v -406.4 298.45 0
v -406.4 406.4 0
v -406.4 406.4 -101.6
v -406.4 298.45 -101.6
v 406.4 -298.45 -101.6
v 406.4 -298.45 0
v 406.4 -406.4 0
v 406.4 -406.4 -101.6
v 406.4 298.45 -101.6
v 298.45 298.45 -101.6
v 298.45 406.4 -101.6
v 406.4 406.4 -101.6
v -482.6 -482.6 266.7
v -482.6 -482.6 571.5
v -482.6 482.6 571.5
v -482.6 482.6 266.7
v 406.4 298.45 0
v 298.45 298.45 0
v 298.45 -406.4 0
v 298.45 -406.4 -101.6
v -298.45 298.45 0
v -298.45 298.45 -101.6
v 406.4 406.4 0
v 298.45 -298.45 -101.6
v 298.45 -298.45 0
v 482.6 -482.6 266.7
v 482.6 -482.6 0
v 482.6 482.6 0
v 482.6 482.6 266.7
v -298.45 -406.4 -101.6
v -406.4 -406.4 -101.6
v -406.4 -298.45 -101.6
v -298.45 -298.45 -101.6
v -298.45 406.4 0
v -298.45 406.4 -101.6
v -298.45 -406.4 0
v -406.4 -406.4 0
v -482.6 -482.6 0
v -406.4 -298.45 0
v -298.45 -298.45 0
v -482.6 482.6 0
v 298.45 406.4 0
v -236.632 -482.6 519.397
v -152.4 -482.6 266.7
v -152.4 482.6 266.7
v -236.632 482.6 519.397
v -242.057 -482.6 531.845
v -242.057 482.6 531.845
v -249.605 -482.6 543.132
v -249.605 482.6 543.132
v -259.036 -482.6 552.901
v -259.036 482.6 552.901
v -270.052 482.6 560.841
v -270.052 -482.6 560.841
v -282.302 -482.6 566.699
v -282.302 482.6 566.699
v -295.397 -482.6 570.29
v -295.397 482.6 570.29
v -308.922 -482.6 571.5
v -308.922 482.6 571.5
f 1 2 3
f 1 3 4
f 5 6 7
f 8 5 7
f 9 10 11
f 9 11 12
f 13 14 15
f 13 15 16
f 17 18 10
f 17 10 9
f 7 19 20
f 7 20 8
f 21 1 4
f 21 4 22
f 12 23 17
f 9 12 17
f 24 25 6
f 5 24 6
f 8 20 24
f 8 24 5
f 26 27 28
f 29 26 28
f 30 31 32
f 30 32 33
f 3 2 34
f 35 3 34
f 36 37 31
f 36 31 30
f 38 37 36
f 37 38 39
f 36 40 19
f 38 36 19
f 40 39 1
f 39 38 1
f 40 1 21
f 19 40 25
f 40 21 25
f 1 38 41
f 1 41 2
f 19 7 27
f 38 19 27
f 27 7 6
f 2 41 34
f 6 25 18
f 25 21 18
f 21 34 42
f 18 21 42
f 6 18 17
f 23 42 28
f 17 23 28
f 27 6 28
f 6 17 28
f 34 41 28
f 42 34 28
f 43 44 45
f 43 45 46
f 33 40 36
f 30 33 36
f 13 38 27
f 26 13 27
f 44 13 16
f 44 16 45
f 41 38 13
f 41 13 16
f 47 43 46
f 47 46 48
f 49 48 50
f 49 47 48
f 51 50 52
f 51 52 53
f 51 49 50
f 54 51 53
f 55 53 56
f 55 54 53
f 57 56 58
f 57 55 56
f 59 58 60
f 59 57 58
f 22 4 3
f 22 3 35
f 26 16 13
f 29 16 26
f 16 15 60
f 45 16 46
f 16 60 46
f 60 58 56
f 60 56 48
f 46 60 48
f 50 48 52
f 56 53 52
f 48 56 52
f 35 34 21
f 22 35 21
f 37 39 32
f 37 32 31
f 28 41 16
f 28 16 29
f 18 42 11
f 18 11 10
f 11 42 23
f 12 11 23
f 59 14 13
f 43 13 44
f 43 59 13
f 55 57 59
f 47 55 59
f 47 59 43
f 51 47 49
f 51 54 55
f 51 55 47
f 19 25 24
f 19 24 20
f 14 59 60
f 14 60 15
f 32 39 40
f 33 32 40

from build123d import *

# Parameters (mm, degrees)
F0_W     = 965.2
F0_H     = 965.2
F1_DEPTH = 266.7
F2_W     = 107.95
F2_H     = 107.95
F3_DEPTH = 101.6
F5_DEPTH = 965.2


with BuildPart() as f1:
    # F0 (on Top) → F1 (new body)
    with BuildSketch(Plane.XY):
        Rectangle(F0_W, F0_H)
    extrude(amount=F1_DEPTH)

    # F2 (on face) → F3 (join)
    with BuildSketch(Plane(origin=(0, 0, 0), x_dir=(1, 0, 0), z_dir=(0, 0, -1))):
        with Locations((-352.425, 352.425)):
            Rectangle(F2_W, F2_H)
        with Locations((352.425, 352.425)):
            Rectangle(F2_W, F2_H)
        with Locations((352.425, -352.425)):
            Rectangle(F2_W, F2_H)
        with Locations((-352.425, -352.425)):
            Rectangle(F2_W, F2_H)
    extrude(amount=F3_DEPTH)


with BuildPart() as f5:
    # F4 (on face) → F5 (new body, through all)
    with BuildSketch(Plane.XZ.offset(482.6)):
        with BuildLine():
            Line((-482.6, 571.5), (-482.6, 266.7))
            Line((-482.6, 266.7), (-152.4, 266.7))
            Line((-152.4, 266.7), (-236.632185, 519.396556))
            ThreePointArc((-236.632185, 519.396556), (-264.366929, 557.116655), (-308.921853, 571.5))
            Line((-308.921853, 571.5), (-482.6, 571.5))
        make_face()
    extrude(amount=-F5_DEPTH)


solid = Compound([f1.part, f5.part])
